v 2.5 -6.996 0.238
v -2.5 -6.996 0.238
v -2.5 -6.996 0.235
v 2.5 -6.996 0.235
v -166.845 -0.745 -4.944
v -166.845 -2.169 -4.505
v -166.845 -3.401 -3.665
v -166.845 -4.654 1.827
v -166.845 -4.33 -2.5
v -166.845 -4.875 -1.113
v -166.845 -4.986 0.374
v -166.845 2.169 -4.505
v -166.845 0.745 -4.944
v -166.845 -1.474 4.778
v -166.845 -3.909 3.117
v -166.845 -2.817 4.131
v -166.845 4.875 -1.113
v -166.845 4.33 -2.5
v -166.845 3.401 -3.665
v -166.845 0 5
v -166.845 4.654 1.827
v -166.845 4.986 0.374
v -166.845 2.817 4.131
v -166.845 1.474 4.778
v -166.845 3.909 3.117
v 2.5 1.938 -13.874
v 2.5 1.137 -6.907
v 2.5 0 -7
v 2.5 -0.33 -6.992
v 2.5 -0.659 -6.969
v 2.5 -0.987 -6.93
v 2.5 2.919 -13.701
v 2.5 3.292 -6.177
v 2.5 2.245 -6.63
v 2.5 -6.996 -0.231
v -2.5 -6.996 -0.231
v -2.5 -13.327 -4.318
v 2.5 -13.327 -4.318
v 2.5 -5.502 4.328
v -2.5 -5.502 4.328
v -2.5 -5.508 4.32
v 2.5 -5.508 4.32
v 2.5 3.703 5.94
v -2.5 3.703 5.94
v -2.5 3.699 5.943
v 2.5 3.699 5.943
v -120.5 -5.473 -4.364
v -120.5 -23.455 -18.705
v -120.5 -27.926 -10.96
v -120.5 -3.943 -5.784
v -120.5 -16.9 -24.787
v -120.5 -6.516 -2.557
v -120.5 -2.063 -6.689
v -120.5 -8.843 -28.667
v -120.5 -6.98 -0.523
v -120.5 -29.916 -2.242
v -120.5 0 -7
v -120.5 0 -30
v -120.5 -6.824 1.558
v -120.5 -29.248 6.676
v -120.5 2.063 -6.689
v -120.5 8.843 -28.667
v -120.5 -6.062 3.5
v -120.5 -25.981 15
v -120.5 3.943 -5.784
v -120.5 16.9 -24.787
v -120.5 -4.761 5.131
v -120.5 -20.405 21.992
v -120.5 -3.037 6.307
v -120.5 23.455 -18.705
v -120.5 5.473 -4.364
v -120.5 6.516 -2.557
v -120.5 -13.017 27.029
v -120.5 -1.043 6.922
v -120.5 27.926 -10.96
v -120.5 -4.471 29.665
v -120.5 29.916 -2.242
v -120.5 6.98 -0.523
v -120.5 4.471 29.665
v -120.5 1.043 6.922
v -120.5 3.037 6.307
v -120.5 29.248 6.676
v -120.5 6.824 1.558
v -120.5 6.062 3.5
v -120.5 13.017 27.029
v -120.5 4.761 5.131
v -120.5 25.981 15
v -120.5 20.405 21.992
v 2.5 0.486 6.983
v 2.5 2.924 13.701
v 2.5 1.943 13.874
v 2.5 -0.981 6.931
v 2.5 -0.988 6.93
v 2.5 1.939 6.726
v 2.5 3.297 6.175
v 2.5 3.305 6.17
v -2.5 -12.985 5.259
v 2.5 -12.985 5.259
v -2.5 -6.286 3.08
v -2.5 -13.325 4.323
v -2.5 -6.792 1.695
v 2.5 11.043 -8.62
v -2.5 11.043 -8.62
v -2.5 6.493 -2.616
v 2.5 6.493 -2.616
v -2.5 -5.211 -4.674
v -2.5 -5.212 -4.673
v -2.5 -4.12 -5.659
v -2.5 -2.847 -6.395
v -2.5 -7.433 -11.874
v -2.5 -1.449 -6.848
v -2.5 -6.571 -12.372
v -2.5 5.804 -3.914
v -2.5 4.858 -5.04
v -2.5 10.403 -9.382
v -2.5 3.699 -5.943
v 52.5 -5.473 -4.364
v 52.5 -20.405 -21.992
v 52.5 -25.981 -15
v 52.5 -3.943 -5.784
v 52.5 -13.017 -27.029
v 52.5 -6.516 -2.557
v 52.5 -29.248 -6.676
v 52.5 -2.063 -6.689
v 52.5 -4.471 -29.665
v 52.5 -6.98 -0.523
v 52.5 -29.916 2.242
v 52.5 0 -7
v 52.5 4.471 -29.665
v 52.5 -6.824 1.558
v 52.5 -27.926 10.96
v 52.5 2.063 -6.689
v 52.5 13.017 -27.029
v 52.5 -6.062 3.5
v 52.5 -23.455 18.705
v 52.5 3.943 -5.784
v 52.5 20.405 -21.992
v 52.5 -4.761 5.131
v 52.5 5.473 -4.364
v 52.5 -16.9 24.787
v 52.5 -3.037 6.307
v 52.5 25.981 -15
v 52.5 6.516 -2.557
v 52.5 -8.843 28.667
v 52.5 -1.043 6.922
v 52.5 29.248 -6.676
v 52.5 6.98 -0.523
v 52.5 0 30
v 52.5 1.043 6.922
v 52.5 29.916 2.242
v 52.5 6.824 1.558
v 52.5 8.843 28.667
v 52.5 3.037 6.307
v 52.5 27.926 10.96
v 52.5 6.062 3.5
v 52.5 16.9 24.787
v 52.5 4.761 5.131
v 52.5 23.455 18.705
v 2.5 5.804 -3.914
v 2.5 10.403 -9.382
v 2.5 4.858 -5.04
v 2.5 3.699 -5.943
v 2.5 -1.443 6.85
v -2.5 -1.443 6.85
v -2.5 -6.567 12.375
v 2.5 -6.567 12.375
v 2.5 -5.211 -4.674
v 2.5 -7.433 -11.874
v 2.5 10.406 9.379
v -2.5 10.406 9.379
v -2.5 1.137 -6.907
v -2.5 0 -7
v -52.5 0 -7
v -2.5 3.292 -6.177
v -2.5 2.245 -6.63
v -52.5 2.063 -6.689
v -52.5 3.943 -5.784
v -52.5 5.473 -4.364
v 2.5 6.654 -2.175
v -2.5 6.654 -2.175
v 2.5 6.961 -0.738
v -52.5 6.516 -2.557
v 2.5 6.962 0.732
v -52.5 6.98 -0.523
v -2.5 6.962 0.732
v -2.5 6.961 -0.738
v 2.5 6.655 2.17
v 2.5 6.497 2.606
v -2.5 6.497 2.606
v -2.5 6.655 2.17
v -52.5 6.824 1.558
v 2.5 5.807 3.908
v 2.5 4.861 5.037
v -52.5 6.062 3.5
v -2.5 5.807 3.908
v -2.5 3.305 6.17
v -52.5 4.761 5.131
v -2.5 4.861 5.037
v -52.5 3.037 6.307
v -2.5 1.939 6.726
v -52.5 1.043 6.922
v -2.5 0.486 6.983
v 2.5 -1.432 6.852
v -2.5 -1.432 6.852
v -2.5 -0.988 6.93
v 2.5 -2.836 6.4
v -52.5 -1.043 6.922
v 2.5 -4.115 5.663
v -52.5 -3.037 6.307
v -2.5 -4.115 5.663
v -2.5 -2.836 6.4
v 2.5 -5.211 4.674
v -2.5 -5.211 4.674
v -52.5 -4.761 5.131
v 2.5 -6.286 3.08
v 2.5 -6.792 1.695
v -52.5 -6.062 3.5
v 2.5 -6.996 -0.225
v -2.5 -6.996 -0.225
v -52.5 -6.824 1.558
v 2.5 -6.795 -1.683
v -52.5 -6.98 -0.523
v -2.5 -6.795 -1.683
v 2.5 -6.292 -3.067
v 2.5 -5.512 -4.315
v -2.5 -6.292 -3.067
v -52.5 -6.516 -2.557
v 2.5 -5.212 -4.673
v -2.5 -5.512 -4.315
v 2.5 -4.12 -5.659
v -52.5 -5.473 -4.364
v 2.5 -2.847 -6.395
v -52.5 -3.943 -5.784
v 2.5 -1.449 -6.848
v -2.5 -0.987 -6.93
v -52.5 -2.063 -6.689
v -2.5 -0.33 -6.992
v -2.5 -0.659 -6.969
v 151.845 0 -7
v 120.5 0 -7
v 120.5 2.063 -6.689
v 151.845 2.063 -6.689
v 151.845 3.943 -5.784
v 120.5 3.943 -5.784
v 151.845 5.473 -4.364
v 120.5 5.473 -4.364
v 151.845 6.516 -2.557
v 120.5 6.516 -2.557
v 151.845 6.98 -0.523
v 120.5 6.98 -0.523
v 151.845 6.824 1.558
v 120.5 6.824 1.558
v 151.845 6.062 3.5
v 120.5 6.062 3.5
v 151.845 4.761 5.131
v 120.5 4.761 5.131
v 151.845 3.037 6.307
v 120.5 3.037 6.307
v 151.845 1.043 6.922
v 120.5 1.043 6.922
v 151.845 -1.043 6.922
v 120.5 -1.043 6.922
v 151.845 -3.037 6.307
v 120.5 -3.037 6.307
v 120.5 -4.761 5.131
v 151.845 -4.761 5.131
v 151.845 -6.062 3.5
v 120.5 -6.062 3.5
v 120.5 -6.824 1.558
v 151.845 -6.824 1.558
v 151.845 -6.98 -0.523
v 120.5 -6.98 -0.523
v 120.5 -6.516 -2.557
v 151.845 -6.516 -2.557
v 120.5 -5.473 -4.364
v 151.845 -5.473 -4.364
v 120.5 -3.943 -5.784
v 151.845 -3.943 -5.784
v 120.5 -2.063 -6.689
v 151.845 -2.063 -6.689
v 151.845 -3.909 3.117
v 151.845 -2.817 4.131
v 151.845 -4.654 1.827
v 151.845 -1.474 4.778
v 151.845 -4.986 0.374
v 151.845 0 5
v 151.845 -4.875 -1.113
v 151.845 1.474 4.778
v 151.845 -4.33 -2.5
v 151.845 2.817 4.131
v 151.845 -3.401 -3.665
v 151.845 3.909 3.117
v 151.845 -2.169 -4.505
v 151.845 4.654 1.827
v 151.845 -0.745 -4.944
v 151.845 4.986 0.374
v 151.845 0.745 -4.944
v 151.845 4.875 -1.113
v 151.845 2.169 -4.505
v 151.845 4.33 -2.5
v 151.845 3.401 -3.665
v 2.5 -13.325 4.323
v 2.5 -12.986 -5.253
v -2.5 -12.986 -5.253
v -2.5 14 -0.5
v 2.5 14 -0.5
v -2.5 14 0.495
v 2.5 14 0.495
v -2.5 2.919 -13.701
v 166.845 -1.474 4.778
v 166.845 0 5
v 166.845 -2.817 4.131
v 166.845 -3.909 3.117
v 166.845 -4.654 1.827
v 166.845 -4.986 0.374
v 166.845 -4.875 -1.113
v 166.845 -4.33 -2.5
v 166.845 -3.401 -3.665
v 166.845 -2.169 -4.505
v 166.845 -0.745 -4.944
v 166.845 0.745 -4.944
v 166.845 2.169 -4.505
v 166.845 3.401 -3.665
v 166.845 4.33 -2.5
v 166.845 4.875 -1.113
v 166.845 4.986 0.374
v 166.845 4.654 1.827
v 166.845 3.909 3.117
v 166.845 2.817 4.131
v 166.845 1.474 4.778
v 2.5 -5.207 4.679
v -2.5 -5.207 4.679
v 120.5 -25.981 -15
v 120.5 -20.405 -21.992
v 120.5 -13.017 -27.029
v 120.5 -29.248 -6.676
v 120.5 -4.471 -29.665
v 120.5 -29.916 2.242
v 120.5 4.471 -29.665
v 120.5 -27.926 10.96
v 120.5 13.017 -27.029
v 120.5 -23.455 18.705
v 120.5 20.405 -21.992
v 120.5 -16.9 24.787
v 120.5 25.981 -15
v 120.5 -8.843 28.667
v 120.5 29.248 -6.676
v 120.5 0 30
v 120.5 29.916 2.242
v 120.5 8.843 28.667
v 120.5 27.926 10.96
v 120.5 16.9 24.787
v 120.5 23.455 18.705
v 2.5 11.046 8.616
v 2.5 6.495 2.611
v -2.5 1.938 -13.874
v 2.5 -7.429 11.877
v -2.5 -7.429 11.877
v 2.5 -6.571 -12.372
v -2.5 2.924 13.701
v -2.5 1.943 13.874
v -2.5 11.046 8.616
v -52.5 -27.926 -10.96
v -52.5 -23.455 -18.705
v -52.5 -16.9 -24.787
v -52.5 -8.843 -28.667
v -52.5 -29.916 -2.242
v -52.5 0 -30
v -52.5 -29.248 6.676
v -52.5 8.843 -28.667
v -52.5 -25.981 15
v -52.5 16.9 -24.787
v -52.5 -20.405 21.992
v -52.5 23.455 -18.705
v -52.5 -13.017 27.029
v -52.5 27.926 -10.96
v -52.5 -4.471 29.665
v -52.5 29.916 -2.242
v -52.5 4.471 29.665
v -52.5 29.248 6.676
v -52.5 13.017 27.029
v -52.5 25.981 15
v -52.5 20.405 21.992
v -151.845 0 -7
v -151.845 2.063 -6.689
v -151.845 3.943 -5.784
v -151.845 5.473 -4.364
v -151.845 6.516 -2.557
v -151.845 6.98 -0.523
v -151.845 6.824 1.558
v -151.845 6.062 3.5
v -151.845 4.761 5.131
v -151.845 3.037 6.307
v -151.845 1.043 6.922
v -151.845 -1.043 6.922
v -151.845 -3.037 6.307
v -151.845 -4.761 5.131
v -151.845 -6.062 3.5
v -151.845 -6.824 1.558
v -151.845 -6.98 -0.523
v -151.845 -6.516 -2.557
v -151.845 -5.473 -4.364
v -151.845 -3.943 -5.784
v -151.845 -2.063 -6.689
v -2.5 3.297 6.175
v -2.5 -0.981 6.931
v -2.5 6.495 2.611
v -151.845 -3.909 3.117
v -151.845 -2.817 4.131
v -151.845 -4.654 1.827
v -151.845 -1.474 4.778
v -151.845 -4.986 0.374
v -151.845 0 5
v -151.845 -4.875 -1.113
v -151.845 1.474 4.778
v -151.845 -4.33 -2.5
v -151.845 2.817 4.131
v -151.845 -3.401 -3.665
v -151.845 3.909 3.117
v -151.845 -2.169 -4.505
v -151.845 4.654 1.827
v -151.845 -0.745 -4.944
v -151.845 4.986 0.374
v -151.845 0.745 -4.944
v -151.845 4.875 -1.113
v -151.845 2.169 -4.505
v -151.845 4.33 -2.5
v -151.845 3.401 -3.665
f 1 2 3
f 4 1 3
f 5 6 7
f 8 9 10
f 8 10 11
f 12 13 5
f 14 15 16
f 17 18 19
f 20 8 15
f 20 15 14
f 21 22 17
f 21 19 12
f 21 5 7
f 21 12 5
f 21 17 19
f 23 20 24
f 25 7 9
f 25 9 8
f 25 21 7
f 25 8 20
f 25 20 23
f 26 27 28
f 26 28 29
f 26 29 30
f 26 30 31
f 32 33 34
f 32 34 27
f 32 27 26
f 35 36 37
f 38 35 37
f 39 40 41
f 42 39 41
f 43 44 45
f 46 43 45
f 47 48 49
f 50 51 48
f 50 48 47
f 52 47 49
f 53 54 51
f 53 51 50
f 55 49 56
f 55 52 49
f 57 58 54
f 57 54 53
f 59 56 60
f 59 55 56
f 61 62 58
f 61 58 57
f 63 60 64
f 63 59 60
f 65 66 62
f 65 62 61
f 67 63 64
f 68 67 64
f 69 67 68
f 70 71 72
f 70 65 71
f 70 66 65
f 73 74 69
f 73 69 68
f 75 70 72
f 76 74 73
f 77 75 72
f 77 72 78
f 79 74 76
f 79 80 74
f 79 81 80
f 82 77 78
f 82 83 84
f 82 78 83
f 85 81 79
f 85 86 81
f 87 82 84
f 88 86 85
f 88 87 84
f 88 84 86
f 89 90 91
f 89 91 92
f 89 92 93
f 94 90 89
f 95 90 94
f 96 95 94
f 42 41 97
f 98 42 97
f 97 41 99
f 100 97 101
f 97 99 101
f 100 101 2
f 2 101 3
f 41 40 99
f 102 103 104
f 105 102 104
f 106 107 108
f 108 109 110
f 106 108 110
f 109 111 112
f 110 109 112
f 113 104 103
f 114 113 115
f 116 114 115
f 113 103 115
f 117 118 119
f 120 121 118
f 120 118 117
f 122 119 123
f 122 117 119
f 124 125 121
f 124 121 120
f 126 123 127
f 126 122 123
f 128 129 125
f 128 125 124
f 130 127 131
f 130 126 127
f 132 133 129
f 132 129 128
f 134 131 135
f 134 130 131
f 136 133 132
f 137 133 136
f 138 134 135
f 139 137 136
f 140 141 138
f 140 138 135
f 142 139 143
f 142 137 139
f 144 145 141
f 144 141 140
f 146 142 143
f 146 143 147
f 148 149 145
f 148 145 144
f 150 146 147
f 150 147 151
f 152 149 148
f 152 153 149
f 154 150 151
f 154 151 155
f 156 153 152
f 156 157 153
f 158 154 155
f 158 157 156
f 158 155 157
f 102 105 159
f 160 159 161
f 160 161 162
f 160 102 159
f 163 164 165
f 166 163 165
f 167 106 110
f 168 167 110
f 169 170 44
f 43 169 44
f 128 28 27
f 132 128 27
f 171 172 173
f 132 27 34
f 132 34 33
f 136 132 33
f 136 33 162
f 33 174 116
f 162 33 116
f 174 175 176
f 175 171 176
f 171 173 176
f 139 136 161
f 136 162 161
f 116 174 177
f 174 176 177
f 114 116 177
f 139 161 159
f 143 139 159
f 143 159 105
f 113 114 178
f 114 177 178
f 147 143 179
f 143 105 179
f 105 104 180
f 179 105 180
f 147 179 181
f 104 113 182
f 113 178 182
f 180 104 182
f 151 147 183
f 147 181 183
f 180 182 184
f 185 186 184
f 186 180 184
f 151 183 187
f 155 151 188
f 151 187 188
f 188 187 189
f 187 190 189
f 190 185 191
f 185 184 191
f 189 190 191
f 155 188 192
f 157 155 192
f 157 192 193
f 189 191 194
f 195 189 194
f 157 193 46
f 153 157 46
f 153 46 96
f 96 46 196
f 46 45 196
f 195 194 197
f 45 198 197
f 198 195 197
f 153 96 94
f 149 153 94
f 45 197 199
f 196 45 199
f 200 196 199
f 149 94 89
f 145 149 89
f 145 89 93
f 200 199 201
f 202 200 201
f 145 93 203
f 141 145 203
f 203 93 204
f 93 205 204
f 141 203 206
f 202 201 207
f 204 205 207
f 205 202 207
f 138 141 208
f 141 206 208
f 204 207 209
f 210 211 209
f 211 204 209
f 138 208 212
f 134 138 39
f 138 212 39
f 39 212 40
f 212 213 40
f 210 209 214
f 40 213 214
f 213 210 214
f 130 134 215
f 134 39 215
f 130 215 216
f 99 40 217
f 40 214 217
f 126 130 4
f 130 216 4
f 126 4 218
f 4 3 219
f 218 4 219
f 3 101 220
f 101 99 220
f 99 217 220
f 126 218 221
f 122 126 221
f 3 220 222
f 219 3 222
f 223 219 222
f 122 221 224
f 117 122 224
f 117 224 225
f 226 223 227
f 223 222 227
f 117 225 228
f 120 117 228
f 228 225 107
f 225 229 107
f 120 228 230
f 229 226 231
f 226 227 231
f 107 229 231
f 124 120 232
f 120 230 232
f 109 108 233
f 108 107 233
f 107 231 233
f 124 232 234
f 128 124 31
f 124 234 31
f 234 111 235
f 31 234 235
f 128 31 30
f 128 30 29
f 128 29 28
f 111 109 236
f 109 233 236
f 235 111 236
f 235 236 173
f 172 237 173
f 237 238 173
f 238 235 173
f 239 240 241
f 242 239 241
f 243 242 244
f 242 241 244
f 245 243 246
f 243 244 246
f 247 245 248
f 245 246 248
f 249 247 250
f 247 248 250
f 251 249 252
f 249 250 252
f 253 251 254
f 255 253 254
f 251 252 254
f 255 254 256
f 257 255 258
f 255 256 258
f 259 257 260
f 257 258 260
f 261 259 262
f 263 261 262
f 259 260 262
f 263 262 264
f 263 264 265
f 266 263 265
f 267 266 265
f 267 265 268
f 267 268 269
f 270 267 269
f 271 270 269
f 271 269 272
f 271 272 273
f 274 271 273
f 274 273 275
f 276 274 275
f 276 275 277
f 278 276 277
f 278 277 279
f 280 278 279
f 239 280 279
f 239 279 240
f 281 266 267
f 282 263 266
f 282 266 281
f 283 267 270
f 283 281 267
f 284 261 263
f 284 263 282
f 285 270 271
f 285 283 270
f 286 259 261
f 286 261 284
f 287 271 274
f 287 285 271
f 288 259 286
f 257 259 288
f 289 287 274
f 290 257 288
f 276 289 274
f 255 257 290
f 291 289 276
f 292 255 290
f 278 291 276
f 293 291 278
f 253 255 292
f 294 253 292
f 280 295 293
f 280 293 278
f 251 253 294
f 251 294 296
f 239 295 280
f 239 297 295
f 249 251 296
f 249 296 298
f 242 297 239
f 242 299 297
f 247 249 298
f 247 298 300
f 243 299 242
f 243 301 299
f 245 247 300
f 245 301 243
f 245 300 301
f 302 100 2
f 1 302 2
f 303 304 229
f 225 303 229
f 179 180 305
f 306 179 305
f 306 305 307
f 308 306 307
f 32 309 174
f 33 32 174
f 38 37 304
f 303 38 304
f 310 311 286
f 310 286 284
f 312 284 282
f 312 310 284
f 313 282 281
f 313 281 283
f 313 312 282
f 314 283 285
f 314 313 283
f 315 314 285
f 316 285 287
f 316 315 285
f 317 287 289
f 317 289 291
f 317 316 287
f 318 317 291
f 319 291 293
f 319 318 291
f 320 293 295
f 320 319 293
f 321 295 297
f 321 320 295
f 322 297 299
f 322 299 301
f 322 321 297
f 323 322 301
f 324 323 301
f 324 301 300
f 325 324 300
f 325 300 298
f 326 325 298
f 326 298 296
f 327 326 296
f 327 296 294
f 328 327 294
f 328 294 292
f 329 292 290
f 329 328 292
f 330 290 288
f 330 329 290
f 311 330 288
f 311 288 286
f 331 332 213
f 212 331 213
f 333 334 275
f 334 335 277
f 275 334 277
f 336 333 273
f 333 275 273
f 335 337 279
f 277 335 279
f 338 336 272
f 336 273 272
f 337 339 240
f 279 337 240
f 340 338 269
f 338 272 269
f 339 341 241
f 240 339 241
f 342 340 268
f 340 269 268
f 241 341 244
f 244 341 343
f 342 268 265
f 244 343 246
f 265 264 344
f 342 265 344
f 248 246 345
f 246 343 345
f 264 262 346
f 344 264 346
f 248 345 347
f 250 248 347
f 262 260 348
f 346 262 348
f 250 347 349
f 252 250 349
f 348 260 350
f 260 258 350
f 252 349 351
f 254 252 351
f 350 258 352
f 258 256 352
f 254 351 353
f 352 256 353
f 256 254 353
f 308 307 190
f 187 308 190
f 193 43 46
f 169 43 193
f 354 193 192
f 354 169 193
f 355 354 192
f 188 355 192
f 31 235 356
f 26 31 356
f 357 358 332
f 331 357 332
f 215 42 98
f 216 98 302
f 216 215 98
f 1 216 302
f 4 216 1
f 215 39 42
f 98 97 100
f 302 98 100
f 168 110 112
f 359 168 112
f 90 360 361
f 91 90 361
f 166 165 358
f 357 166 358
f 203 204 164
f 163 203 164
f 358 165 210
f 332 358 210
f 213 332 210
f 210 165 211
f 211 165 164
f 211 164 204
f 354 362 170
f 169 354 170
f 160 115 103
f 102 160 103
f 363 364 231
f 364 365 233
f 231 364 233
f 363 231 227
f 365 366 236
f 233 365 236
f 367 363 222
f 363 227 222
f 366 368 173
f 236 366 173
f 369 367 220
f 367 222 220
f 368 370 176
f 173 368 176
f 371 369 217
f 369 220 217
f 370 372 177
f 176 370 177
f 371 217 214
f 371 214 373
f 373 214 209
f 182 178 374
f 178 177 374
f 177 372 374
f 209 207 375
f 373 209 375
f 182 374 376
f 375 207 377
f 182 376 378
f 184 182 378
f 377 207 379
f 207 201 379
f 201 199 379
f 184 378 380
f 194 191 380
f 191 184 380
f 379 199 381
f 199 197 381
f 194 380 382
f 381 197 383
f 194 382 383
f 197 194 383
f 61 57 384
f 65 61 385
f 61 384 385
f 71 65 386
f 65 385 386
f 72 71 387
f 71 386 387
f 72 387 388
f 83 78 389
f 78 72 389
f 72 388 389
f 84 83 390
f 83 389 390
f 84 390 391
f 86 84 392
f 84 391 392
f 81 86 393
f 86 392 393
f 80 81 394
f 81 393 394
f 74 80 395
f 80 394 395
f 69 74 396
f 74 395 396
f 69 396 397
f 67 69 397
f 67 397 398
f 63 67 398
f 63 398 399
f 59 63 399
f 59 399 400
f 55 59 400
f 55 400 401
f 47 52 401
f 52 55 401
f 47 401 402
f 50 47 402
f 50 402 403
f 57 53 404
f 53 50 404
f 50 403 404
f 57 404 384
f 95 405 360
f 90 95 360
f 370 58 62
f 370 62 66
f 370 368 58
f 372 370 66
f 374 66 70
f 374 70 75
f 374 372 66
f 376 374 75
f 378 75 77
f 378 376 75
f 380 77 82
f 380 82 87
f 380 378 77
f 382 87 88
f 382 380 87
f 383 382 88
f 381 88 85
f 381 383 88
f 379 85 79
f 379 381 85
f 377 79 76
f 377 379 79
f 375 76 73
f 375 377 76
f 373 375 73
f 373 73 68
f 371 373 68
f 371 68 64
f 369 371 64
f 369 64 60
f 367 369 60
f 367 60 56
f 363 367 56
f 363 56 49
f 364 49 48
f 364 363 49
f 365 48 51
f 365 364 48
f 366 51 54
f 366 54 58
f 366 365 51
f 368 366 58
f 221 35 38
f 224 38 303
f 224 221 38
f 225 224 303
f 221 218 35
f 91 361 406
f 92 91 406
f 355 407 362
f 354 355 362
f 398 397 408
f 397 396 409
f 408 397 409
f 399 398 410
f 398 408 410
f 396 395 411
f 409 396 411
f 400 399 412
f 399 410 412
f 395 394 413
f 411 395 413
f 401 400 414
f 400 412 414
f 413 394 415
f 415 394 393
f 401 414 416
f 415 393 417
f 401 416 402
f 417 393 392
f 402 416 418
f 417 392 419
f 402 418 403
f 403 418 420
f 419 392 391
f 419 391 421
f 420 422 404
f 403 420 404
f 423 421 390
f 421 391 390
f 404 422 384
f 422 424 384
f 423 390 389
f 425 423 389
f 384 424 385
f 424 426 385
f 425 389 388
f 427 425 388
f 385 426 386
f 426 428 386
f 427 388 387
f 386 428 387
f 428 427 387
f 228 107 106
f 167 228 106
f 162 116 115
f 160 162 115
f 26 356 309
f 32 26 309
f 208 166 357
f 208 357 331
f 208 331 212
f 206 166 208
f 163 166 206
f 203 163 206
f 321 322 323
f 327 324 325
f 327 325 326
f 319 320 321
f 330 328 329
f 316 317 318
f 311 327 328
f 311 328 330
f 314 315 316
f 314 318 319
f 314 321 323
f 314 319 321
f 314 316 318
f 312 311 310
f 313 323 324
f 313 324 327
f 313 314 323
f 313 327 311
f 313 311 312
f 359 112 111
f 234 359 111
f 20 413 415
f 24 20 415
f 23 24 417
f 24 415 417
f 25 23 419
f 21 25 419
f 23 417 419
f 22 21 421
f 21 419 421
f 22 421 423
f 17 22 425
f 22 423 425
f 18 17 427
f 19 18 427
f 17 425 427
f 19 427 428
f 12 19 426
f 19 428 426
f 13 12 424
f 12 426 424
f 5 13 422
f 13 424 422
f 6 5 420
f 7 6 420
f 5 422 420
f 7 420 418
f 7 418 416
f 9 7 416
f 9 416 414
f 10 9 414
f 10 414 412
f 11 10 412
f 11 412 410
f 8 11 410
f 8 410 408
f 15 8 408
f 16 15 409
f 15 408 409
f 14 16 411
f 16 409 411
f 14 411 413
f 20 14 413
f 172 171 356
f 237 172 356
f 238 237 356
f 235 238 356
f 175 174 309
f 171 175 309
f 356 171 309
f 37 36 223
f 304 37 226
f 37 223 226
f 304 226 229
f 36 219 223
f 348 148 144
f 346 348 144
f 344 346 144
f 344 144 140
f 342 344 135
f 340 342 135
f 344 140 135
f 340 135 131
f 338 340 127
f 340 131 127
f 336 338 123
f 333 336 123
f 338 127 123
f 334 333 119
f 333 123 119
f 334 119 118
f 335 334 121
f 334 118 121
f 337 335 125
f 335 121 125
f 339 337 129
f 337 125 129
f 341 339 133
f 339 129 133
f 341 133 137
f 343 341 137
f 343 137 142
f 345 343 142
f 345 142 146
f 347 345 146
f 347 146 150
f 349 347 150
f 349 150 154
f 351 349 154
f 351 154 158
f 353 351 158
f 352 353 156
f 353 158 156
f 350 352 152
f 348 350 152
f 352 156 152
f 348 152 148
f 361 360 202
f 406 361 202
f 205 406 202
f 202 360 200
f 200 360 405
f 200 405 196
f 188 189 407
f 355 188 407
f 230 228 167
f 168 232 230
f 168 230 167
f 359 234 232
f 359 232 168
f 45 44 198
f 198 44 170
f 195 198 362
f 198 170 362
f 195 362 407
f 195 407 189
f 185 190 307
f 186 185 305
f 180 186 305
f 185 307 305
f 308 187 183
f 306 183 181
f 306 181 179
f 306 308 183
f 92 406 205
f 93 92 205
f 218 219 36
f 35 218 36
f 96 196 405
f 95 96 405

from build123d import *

# Parameters (mm, degrees)
BOSS_EXTRU_2_DEPTH      = 151.845
BOSS_EXTRU_2_DEPTH_BACK = 151.845
ESQUISSE1_R             = 7
ESQUISSE3_W             = 68
ESQUISSE3_H             = 30
ESQUISSE3_H_2           = 35
ESQUISSE4_R             = 5
BOSS_EXTRU_3_DEPTH      = 15
BOSS_EXTRU_4_START      = 15
ESQUISSE5_R             = 5
BOSS_EXTRU_4_DEPTH      = 15
BOSS_EXTRU_6_DEPTH      = 2.5
BOSS_EXTRU_6_DEPTH_BACK = 2.5
ENL_V_START             = -68
ESQUISSE11_R            = 35
ESQUISSE11_R_2          = 30
ENL_V_MAT_EXTRU_1_DEPTH = 68


with BuildPart() as part:
    # Esquisse1 → Boss.-Extru.2 (new, two sides: drawn at the far end of the back side and taken through both)
    with BuildSketch(Plane(origin=(0, 0, 0), x_dir=(0, 0, -1), z_dir=(1, 0, 0)).offset(-BOSS_EXTRU_2_DEPTH_BACK)):
        Circle(ESQUISSE1_R)
    extrude(amount=BOSS_EXTRU_2_DEPTH + BOSS_EXTRU_2_DEPTH_BACK)

    # Esquisse3 → Révolution2 (revolve)
    with BuildSketch(Plane.XY, mode=Mode.PRIVATE) as r_volution2_sk:
        with Locations((-86.5, 15)):
            Rectangle(ESQUISSE3_W, ESQUISSE3_H)
        with Locations((86.5, 17.5)):
            Rectangle(ESQUISSE3_W, ESQUISSE3_H_2)
    revolve(r_volution2_sk.sketch.rotate(Axis((-120.5, 0, 0), (1, 0, 0)), 270), axis=Axis((-120.5, 0, 0), (1, 0, 0)))

    # Esquisse4 → Boss.-Extru.3 (add)
    with BuildSketch(Plane.ZY.offset(151.845)):
        Circle(ESQUISSE4_R)
    extrude(amount=BOSS_EXTRU_3_DEPTH)

    # Esquisse5 → Boss.-Extru.4 (add)
    with BuildSketch(Plane(origin=(151.845, 0, 0), x_dir=(0, 0, -1), z_dir=(1, 0, 0)).offset(BOSS_EXTRU_4_START)):
        with Locations(Location((0, 0, 0), (0, 0, 180))):
            Circle(ESQUISSE5_R)
    extrude(amount=-BOSS_EXTRU_4_DEPTH)

    # Esquisse6 → Boss.-Extru.6 (add, two sides: drawn at the far end of the back side and taken through both)
    with BuildSketch(Plane(origin=(0, 0, 0), x_dir=(0, 0, -1), z_dir=(1, 0, 0)).offset(-BOSS_EXTRU_6_DEPTH_BACK)):
        Polygon((-0.495363477, 14), (-2.169953885, 6.655170932), (-2.610793017, 6.495072622), (-8.616105681, 11.046145282), (-9.378598341, 10.406337972), (-5.940243898, 3.703466513), (-6.175037056, 3.29745816), (-13.700746567, 2.923641509), (-13.873589621, 1.94339984), (-6.931134583, -0.98116596), (-6.850019438, -1.443108535), (-12.374762678, -6.566901532), (-11.87708094, -7.428911588), (-4.678977177, -5.206734889), (-4.319908407, -5.508463622), (-5.258596613, -12.984753276), (-4.323260899, -13.325187635), (-0.237581159, -6.99604961), (0.231428968, -6.996382273), (4.31801844, -13.326929566), (5.253354154, -12.986495207), (4.314874913, -5.51186988), (4.674371346, -5.210650816), (11.874077864, -7.433322313), (12.371759603, -6.571312256), (6.848246248, -1.448659888), (6.93001661, -0.986832845), (13.87401748, 1.938384149), (13.701174426, 2.918625818), (6.177140243, 3.292359253), (5.942923274, 3.698700268), (9.382043313, 10.403064212), (8.619550653, 11.042871522), (2.615574856, 6.492811995), (2.174963279, 6.653535506), (0.5, 14), align=None)
    extrude(amount=BOSS_EXTRU_6_DEPTH + BOSS_EXTRU_6_DEPTH_BACK)

    # Esquisse11 → Enlèv. mat.-Extru.1 (cut)
    with BuildSketch(Plane(origin=(120.5, 0, 0), x_dir=(0, 0, -1), z_dir=(1, 0, 0)).offset(ENL_V_START)):
        Circle(ESQUISSE11_R)
        with Locations(Location((0, 0, 0), (0, 0, 180))):
            Circle(ESQUISSE11_R_2, mode=Mode.SUBTRACT)
    extrude(amount=ENL_V_MAT_EXTRU_1_DEPTH, mode=Mode.SUBTRACT)


solid = part.part
